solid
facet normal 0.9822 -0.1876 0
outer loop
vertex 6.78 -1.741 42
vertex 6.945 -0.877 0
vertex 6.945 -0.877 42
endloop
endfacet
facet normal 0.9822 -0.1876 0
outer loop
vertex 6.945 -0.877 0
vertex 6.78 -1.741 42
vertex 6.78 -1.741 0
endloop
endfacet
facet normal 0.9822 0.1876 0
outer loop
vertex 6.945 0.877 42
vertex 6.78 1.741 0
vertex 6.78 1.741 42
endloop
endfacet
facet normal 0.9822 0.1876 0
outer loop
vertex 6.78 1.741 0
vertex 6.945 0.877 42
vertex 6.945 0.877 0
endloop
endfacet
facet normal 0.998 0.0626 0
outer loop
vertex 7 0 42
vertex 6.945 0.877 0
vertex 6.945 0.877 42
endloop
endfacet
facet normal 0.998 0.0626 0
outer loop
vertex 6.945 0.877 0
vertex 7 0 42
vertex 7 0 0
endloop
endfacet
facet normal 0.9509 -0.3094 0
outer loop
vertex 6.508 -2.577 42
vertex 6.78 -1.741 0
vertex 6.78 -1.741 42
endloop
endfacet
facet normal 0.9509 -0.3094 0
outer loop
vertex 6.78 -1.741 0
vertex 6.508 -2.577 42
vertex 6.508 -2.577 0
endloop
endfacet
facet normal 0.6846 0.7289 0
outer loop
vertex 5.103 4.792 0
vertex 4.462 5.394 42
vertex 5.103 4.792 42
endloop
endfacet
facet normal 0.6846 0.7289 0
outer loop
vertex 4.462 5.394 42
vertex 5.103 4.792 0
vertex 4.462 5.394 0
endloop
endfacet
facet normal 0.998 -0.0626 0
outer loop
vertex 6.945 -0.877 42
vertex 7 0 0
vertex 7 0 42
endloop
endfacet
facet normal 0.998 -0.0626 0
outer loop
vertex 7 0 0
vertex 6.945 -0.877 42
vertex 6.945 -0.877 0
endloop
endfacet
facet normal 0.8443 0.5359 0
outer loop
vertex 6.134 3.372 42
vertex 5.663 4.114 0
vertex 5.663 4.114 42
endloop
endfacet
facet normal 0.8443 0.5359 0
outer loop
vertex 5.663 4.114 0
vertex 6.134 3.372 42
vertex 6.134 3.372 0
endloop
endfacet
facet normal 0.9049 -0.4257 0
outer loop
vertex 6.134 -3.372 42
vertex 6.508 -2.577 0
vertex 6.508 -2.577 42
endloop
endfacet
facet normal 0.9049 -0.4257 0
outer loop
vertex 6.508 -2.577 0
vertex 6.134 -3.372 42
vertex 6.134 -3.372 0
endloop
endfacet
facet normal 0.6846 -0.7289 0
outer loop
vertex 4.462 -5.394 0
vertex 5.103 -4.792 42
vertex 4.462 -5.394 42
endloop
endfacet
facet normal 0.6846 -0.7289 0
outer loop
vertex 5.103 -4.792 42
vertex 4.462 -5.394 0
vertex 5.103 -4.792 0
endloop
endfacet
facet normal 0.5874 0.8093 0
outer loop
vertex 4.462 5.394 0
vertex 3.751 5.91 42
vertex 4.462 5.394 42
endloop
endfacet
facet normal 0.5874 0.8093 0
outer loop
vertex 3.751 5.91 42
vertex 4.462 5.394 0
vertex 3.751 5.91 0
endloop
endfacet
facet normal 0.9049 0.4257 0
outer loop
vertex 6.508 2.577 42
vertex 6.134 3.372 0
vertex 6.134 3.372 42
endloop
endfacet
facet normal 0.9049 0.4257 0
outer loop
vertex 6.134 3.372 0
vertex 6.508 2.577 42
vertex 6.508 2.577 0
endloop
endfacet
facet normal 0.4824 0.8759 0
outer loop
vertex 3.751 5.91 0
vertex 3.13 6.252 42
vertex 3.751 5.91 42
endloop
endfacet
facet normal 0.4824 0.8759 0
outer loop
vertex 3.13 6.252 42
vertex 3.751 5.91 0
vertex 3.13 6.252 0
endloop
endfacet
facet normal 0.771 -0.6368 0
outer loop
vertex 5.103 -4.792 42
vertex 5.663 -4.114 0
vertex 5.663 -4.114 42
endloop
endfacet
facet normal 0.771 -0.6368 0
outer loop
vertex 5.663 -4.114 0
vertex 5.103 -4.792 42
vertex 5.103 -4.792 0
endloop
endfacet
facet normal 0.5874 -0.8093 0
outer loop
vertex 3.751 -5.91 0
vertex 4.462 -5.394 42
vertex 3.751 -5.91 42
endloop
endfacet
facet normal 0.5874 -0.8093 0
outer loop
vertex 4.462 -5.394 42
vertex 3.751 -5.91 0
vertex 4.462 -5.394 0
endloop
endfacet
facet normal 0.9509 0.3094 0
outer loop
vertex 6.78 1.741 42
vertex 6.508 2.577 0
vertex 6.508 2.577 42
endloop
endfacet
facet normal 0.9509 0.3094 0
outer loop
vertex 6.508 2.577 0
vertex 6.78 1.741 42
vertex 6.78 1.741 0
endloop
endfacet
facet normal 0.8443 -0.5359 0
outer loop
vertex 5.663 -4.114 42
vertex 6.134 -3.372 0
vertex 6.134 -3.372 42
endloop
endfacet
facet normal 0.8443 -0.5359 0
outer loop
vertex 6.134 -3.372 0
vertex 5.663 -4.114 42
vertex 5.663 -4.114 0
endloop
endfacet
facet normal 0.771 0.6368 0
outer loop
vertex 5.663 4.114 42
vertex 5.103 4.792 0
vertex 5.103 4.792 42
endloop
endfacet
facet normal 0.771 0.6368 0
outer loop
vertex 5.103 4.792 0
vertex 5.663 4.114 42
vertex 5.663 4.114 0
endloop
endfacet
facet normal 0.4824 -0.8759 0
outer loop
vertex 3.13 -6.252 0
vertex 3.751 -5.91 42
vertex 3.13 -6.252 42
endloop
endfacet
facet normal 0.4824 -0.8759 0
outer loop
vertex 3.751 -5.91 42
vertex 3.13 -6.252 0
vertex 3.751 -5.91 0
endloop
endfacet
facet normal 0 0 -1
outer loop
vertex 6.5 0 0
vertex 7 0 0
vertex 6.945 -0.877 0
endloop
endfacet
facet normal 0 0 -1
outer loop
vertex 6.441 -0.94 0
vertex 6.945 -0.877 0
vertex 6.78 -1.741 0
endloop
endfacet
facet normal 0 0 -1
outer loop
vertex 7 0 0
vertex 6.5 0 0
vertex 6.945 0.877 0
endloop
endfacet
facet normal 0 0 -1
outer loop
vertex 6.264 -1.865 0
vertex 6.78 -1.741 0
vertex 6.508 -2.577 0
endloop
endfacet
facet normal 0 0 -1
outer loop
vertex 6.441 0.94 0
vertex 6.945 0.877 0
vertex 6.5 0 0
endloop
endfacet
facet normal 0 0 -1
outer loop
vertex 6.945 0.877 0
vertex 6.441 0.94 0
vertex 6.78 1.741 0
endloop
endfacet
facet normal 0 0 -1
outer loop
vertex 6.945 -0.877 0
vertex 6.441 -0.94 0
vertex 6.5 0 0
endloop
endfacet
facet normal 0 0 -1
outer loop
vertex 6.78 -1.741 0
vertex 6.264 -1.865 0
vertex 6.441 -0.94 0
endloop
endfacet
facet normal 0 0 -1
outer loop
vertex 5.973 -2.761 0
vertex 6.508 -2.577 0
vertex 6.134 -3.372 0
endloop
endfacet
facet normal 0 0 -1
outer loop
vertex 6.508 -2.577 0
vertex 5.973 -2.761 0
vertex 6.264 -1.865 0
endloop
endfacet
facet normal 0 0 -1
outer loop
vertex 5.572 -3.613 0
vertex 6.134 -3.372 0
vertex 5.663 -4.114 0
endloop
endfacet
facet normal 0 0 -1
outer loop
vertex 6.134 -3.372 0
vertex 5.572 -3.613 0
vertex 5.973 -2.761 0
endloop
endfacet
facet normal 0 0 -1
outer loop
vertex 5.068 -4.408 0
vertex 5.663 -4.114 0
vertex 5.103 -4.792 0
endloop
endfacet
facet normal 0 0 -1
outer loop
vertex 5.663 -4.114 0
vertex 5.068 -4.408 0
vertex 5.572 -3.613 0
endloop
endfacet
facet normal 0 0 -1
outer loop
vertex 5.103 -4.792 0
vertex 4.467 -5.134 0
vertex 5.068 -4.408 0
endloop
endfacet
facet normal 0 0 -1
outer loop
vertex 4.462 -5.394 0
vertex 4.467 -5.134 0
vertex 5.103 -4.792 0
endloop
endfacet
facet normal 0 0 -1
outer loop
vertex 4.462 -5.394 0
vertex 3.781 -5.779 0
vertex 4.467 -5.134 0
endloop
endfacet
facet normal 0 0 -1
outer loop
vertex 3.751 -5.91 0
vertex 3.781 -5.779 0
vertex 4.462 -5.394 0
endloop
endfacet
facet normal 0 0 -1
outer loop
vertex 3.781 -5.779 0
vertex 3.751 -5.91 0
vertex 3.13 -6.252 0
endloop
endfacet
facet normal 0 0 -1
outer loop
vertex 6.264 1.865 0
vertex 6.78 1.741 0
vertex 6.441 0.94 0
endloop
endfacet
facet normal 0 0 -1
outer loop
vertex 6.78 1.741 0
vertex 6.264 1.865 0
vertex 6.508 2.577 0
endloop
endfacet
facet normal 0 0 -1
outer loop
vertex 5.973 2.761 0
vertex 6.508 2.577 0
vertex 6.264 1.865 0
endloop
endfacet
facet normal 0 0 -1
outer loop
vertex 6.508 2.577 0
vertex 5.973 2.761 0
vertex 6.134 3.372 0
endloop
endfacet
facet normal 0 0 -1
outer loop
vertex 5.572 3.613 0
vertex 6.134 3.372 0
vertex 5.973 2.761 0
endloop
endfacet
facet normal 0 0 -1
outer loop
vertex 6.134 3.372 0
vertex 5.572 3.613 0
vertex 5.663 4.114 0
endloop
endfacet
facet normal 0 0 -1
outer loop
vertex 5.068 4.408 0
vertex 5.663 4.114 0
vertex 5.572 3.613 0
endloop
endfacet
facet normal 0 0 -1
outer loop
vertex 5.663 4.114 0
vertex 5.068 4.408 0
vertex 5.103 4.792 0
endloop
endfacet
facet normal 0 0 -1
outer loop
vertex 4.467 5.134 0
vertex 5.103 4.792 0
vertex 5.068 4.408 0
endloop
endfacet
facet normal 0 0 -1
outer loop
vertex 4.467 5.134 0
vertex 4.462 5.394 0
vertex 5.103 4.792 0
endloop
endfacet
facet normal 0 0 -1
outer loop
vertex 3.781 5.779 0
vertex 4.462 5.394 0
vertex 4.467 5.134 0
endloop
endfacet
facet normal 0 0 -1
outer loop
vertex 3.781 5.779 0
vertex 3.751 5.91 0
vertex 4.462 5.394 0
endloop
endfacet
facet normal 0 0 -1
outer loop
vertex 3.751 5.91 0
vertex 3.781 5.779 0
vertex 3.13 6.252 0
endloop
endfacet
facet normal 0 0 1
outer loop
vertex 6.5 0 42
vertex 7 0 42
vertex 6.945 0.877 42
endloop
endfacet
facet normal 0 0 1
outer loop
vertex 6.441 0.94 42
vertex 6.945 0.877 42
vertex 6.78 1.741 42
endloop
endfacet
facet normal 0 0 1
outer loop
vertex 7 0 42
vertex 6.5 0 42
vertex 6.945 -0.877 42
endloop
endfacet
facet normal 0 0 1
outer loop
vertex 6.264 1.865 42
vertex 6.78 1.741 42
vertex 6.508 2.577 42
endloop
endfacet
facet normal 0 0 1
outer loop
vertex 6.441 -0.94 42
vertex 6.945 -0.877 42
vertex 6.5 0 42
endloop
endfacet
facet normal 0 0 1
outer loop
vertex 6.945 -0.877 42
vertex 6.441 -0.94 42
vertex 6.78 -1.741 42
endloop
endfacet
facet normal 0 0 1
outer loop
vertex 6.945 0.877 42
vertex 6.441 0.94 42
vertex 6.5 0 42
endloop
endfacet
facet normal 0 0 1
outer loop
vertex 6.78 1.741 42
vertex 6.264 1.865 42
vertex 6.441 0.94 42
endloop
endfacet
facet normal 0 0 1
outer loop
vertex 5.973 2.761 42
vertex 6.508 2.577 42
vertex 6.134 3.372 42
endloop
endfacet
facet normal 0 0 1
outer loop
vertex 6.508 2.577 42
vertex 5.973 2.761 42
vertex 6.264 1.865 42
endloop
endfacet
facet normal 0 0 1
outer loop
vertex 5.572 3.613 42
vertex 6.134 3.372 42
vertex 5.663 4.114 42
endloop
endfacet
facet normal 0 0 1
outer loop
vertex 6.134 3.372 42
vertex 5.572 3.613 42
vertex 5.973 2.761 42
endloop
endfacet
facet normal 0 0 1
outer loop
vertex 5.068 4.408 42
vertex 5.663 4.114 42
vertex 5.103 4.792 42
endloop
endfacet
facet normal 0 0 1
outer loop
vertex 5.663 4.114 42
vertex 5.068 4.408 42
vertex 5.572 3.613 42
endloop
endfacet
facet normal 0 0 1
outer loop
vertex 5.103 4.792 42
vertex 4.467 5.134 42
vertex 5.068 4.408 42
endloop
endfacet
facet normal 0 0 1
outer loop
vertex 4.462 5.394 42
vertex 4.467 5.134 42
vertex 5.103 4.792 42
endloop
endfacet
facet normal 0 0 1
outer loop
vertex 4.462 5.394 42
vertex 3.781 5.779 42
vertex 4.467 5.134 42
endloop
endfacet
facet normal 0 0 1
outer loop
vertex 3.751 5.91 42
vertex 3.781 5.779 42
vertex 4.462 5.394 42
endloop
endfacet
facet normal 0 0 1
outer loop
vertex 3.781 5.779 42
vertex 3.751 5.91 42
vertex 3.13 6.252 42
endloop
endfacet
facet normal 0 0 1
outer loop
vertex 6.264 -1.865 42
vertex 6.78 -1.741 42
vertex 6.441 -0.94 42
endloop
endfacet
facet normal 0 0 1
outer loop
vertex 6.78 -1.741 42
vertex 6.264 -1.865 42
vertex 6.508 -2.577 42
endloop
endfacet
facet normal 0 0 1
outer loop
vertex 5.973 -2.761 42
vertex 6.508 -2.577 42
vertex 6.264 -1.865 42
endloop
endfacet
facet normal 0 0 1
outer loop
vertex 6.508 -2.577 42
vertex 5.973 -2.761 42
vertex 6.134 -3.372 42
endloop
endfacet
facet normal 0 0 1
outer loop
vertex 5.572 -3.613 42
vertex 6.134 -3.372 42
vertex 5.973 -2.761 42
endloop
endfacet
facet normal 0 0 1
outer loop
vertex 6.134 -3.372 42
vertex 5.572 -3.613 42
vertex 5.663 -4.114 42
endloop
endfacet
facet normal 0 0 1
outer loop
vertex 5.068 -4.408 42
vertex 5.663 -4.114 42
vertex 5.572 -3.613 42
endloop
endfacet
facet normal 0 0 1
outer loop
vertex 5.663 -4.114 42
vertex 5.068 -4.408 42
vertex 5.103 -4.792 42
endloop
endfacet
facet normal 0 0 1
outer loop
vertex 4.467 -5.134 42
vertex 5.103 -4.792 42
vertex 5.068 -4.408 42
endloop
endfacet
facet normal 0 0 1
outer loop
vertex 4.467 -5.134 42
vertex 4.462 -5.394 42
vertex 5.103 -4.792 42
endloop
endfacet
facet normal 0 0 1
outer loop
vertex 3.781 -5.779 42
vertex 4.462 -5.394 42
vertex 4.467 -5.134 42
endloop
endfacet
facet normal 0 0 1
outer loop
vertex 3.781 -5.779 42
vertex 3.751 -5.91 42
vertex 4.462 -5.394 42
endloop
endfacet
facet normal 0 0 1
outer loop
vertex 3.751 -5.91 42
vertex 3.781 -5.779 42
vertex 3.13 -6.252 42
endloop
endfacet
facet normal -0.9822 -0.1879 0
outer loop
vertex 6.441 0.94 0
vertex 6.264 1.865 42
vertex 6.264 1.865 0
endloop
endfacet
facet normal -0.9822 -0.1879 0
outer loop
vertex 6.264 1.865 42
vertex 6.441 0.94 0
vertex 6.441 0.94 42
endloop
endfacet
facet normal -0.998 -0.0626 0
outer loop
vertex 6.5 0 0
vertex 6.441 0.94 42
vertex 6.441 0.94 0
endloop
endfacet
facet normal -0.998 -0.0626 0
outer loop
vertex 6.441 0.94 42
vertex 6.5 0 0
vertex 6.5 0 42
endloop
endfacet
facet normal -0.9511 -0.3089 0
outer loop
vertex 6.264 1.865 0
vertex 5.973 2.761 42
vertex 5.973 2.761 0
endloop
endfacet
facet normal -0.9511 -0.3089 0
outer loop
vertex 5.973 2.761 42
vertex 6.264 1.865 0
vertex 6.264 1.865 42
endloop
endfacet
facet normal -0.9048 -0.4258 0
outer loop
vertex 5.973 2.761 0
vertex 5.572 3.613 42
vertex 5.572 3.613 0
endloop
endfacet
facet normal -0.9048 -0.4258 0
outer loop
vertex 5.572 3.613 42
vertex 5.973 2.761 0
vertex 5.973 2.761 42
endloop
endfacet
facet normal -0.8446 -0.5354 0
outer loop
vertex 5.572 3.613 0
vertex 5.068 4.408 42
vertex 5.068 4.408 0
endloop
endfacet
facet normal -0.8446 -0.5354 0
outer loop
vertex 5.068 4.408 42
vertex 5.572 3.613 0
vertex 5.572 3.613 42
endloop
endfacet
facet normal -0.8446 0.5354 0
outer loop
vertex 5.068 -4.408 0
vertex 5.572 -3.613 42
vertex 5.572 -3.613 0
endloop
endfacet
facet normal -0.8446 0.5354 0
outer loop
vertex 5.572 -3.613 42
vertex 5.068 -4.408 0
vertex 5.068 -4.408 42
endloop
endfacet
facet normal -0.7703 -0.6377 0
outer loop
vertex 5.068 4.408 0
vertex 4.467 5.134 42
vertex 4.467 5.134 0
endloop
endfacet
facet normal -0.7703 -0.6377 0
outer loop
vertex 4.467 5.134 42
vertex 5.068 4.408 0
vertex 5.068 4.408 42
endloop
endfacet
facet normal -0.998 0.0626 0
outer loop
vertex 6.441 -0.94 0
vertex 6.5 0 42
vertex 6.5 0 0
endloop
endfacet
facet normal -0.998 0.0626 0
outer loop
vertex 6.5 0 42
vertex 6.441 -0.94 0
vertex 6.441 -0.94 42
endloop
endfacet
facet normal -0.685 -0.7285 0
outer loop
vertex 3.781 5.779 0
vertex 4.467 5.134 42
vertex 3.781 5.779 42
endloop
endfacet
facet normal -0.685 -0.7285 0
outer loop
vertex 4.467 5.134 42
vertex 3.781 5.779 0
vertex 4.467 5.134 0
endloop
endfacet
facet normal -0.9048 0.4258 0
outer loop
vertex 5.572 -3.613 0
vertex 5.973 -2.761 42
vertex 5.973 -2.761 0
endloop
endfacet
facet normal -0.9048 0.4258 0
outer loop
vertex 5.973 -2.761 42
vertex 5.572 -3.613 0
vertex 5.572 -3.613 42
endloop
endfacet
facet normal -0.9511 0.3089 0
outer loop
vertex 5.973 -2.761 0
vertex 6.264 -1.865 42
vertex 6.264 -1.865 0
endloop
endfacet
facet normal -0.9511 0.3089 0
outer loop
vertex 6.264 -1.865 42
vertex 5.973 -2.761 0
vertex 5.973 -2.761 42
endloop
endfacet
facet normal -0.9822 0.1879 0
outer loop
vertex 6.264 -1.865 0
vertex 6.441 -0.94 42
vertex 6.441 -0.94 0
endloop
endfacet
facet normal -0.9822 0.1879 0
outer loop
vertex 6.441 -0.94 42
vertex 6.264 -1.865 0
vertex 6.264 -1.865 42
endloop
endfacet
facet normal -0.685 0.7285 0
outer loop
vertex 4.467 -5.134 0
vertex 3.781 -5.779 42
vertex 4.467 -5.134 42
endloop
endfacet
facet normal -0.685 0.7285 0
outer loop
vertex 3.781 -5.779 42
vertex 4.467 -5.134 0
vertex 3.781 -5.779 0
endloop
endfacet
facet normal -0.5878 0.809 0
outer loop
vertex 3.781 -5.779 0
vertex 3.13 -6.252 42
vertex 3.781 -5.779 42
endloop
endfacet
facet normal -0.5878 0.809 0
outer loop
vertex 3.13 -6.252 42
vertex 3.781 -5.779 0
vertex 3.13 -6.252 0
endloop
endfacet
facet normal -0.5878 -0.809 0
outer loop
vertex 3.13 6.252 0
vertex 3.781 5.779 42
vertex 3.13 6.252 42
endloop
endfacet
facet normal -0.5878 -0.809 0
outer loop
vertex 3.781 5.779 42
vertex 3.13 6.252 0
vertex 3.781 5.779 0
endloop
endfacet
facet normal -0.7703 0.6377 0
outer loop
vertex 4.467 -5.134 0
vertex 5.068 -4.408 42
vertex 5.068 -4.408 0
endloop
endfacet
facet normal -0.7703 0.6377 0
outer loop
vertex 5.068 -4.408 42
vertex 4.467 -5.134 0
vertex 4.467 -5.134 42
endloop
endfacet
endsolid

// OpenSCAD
$fn = 50;


difference() {
	union() {
		cylinder(h = 42, r = 7.0000000000);
		translate(v = [-4.0000000000, 0, 0]) {
			cylinder(h = 42, r = 7.0000000000);
		}
	}
	union() {
		cylinder(h = 42, r = 3.2500000000);
		cylinder(h = 42, r = 1.8000000000);
		cylinder(h = 42, r = 1.8000000000);
		cylinder(h = 42, r = 1.8000000000);
		translate(v = [-8.5000000000, 0, 0]) {
			hull() {
				translate(v = [-3.7500000000, 0.0000000000, 0]) {
					cylinder(h = 42, r = 7.5000000000);
				}
				translate(v = [3.7500000000, 0.0000000000, 0]) {
					cylinder(h = 42, r = 7.5000000000);
				}
				translate(v = [-3.7500000000, -0.0000000000, 0]) {
					cylinder(h = 42, r = 7.5000000000);
				}
				translate(v = [3.7500000000, -0.0000000000, 0]) {
					cylinder(h = 42, r = 7.5000000000);
				}
			}
		}
		translate(v = [-1.0000000000, 0, 0.0000000000]) {
			cylinder(h = 42, r = 7.5000000000);
		}
	}
}
